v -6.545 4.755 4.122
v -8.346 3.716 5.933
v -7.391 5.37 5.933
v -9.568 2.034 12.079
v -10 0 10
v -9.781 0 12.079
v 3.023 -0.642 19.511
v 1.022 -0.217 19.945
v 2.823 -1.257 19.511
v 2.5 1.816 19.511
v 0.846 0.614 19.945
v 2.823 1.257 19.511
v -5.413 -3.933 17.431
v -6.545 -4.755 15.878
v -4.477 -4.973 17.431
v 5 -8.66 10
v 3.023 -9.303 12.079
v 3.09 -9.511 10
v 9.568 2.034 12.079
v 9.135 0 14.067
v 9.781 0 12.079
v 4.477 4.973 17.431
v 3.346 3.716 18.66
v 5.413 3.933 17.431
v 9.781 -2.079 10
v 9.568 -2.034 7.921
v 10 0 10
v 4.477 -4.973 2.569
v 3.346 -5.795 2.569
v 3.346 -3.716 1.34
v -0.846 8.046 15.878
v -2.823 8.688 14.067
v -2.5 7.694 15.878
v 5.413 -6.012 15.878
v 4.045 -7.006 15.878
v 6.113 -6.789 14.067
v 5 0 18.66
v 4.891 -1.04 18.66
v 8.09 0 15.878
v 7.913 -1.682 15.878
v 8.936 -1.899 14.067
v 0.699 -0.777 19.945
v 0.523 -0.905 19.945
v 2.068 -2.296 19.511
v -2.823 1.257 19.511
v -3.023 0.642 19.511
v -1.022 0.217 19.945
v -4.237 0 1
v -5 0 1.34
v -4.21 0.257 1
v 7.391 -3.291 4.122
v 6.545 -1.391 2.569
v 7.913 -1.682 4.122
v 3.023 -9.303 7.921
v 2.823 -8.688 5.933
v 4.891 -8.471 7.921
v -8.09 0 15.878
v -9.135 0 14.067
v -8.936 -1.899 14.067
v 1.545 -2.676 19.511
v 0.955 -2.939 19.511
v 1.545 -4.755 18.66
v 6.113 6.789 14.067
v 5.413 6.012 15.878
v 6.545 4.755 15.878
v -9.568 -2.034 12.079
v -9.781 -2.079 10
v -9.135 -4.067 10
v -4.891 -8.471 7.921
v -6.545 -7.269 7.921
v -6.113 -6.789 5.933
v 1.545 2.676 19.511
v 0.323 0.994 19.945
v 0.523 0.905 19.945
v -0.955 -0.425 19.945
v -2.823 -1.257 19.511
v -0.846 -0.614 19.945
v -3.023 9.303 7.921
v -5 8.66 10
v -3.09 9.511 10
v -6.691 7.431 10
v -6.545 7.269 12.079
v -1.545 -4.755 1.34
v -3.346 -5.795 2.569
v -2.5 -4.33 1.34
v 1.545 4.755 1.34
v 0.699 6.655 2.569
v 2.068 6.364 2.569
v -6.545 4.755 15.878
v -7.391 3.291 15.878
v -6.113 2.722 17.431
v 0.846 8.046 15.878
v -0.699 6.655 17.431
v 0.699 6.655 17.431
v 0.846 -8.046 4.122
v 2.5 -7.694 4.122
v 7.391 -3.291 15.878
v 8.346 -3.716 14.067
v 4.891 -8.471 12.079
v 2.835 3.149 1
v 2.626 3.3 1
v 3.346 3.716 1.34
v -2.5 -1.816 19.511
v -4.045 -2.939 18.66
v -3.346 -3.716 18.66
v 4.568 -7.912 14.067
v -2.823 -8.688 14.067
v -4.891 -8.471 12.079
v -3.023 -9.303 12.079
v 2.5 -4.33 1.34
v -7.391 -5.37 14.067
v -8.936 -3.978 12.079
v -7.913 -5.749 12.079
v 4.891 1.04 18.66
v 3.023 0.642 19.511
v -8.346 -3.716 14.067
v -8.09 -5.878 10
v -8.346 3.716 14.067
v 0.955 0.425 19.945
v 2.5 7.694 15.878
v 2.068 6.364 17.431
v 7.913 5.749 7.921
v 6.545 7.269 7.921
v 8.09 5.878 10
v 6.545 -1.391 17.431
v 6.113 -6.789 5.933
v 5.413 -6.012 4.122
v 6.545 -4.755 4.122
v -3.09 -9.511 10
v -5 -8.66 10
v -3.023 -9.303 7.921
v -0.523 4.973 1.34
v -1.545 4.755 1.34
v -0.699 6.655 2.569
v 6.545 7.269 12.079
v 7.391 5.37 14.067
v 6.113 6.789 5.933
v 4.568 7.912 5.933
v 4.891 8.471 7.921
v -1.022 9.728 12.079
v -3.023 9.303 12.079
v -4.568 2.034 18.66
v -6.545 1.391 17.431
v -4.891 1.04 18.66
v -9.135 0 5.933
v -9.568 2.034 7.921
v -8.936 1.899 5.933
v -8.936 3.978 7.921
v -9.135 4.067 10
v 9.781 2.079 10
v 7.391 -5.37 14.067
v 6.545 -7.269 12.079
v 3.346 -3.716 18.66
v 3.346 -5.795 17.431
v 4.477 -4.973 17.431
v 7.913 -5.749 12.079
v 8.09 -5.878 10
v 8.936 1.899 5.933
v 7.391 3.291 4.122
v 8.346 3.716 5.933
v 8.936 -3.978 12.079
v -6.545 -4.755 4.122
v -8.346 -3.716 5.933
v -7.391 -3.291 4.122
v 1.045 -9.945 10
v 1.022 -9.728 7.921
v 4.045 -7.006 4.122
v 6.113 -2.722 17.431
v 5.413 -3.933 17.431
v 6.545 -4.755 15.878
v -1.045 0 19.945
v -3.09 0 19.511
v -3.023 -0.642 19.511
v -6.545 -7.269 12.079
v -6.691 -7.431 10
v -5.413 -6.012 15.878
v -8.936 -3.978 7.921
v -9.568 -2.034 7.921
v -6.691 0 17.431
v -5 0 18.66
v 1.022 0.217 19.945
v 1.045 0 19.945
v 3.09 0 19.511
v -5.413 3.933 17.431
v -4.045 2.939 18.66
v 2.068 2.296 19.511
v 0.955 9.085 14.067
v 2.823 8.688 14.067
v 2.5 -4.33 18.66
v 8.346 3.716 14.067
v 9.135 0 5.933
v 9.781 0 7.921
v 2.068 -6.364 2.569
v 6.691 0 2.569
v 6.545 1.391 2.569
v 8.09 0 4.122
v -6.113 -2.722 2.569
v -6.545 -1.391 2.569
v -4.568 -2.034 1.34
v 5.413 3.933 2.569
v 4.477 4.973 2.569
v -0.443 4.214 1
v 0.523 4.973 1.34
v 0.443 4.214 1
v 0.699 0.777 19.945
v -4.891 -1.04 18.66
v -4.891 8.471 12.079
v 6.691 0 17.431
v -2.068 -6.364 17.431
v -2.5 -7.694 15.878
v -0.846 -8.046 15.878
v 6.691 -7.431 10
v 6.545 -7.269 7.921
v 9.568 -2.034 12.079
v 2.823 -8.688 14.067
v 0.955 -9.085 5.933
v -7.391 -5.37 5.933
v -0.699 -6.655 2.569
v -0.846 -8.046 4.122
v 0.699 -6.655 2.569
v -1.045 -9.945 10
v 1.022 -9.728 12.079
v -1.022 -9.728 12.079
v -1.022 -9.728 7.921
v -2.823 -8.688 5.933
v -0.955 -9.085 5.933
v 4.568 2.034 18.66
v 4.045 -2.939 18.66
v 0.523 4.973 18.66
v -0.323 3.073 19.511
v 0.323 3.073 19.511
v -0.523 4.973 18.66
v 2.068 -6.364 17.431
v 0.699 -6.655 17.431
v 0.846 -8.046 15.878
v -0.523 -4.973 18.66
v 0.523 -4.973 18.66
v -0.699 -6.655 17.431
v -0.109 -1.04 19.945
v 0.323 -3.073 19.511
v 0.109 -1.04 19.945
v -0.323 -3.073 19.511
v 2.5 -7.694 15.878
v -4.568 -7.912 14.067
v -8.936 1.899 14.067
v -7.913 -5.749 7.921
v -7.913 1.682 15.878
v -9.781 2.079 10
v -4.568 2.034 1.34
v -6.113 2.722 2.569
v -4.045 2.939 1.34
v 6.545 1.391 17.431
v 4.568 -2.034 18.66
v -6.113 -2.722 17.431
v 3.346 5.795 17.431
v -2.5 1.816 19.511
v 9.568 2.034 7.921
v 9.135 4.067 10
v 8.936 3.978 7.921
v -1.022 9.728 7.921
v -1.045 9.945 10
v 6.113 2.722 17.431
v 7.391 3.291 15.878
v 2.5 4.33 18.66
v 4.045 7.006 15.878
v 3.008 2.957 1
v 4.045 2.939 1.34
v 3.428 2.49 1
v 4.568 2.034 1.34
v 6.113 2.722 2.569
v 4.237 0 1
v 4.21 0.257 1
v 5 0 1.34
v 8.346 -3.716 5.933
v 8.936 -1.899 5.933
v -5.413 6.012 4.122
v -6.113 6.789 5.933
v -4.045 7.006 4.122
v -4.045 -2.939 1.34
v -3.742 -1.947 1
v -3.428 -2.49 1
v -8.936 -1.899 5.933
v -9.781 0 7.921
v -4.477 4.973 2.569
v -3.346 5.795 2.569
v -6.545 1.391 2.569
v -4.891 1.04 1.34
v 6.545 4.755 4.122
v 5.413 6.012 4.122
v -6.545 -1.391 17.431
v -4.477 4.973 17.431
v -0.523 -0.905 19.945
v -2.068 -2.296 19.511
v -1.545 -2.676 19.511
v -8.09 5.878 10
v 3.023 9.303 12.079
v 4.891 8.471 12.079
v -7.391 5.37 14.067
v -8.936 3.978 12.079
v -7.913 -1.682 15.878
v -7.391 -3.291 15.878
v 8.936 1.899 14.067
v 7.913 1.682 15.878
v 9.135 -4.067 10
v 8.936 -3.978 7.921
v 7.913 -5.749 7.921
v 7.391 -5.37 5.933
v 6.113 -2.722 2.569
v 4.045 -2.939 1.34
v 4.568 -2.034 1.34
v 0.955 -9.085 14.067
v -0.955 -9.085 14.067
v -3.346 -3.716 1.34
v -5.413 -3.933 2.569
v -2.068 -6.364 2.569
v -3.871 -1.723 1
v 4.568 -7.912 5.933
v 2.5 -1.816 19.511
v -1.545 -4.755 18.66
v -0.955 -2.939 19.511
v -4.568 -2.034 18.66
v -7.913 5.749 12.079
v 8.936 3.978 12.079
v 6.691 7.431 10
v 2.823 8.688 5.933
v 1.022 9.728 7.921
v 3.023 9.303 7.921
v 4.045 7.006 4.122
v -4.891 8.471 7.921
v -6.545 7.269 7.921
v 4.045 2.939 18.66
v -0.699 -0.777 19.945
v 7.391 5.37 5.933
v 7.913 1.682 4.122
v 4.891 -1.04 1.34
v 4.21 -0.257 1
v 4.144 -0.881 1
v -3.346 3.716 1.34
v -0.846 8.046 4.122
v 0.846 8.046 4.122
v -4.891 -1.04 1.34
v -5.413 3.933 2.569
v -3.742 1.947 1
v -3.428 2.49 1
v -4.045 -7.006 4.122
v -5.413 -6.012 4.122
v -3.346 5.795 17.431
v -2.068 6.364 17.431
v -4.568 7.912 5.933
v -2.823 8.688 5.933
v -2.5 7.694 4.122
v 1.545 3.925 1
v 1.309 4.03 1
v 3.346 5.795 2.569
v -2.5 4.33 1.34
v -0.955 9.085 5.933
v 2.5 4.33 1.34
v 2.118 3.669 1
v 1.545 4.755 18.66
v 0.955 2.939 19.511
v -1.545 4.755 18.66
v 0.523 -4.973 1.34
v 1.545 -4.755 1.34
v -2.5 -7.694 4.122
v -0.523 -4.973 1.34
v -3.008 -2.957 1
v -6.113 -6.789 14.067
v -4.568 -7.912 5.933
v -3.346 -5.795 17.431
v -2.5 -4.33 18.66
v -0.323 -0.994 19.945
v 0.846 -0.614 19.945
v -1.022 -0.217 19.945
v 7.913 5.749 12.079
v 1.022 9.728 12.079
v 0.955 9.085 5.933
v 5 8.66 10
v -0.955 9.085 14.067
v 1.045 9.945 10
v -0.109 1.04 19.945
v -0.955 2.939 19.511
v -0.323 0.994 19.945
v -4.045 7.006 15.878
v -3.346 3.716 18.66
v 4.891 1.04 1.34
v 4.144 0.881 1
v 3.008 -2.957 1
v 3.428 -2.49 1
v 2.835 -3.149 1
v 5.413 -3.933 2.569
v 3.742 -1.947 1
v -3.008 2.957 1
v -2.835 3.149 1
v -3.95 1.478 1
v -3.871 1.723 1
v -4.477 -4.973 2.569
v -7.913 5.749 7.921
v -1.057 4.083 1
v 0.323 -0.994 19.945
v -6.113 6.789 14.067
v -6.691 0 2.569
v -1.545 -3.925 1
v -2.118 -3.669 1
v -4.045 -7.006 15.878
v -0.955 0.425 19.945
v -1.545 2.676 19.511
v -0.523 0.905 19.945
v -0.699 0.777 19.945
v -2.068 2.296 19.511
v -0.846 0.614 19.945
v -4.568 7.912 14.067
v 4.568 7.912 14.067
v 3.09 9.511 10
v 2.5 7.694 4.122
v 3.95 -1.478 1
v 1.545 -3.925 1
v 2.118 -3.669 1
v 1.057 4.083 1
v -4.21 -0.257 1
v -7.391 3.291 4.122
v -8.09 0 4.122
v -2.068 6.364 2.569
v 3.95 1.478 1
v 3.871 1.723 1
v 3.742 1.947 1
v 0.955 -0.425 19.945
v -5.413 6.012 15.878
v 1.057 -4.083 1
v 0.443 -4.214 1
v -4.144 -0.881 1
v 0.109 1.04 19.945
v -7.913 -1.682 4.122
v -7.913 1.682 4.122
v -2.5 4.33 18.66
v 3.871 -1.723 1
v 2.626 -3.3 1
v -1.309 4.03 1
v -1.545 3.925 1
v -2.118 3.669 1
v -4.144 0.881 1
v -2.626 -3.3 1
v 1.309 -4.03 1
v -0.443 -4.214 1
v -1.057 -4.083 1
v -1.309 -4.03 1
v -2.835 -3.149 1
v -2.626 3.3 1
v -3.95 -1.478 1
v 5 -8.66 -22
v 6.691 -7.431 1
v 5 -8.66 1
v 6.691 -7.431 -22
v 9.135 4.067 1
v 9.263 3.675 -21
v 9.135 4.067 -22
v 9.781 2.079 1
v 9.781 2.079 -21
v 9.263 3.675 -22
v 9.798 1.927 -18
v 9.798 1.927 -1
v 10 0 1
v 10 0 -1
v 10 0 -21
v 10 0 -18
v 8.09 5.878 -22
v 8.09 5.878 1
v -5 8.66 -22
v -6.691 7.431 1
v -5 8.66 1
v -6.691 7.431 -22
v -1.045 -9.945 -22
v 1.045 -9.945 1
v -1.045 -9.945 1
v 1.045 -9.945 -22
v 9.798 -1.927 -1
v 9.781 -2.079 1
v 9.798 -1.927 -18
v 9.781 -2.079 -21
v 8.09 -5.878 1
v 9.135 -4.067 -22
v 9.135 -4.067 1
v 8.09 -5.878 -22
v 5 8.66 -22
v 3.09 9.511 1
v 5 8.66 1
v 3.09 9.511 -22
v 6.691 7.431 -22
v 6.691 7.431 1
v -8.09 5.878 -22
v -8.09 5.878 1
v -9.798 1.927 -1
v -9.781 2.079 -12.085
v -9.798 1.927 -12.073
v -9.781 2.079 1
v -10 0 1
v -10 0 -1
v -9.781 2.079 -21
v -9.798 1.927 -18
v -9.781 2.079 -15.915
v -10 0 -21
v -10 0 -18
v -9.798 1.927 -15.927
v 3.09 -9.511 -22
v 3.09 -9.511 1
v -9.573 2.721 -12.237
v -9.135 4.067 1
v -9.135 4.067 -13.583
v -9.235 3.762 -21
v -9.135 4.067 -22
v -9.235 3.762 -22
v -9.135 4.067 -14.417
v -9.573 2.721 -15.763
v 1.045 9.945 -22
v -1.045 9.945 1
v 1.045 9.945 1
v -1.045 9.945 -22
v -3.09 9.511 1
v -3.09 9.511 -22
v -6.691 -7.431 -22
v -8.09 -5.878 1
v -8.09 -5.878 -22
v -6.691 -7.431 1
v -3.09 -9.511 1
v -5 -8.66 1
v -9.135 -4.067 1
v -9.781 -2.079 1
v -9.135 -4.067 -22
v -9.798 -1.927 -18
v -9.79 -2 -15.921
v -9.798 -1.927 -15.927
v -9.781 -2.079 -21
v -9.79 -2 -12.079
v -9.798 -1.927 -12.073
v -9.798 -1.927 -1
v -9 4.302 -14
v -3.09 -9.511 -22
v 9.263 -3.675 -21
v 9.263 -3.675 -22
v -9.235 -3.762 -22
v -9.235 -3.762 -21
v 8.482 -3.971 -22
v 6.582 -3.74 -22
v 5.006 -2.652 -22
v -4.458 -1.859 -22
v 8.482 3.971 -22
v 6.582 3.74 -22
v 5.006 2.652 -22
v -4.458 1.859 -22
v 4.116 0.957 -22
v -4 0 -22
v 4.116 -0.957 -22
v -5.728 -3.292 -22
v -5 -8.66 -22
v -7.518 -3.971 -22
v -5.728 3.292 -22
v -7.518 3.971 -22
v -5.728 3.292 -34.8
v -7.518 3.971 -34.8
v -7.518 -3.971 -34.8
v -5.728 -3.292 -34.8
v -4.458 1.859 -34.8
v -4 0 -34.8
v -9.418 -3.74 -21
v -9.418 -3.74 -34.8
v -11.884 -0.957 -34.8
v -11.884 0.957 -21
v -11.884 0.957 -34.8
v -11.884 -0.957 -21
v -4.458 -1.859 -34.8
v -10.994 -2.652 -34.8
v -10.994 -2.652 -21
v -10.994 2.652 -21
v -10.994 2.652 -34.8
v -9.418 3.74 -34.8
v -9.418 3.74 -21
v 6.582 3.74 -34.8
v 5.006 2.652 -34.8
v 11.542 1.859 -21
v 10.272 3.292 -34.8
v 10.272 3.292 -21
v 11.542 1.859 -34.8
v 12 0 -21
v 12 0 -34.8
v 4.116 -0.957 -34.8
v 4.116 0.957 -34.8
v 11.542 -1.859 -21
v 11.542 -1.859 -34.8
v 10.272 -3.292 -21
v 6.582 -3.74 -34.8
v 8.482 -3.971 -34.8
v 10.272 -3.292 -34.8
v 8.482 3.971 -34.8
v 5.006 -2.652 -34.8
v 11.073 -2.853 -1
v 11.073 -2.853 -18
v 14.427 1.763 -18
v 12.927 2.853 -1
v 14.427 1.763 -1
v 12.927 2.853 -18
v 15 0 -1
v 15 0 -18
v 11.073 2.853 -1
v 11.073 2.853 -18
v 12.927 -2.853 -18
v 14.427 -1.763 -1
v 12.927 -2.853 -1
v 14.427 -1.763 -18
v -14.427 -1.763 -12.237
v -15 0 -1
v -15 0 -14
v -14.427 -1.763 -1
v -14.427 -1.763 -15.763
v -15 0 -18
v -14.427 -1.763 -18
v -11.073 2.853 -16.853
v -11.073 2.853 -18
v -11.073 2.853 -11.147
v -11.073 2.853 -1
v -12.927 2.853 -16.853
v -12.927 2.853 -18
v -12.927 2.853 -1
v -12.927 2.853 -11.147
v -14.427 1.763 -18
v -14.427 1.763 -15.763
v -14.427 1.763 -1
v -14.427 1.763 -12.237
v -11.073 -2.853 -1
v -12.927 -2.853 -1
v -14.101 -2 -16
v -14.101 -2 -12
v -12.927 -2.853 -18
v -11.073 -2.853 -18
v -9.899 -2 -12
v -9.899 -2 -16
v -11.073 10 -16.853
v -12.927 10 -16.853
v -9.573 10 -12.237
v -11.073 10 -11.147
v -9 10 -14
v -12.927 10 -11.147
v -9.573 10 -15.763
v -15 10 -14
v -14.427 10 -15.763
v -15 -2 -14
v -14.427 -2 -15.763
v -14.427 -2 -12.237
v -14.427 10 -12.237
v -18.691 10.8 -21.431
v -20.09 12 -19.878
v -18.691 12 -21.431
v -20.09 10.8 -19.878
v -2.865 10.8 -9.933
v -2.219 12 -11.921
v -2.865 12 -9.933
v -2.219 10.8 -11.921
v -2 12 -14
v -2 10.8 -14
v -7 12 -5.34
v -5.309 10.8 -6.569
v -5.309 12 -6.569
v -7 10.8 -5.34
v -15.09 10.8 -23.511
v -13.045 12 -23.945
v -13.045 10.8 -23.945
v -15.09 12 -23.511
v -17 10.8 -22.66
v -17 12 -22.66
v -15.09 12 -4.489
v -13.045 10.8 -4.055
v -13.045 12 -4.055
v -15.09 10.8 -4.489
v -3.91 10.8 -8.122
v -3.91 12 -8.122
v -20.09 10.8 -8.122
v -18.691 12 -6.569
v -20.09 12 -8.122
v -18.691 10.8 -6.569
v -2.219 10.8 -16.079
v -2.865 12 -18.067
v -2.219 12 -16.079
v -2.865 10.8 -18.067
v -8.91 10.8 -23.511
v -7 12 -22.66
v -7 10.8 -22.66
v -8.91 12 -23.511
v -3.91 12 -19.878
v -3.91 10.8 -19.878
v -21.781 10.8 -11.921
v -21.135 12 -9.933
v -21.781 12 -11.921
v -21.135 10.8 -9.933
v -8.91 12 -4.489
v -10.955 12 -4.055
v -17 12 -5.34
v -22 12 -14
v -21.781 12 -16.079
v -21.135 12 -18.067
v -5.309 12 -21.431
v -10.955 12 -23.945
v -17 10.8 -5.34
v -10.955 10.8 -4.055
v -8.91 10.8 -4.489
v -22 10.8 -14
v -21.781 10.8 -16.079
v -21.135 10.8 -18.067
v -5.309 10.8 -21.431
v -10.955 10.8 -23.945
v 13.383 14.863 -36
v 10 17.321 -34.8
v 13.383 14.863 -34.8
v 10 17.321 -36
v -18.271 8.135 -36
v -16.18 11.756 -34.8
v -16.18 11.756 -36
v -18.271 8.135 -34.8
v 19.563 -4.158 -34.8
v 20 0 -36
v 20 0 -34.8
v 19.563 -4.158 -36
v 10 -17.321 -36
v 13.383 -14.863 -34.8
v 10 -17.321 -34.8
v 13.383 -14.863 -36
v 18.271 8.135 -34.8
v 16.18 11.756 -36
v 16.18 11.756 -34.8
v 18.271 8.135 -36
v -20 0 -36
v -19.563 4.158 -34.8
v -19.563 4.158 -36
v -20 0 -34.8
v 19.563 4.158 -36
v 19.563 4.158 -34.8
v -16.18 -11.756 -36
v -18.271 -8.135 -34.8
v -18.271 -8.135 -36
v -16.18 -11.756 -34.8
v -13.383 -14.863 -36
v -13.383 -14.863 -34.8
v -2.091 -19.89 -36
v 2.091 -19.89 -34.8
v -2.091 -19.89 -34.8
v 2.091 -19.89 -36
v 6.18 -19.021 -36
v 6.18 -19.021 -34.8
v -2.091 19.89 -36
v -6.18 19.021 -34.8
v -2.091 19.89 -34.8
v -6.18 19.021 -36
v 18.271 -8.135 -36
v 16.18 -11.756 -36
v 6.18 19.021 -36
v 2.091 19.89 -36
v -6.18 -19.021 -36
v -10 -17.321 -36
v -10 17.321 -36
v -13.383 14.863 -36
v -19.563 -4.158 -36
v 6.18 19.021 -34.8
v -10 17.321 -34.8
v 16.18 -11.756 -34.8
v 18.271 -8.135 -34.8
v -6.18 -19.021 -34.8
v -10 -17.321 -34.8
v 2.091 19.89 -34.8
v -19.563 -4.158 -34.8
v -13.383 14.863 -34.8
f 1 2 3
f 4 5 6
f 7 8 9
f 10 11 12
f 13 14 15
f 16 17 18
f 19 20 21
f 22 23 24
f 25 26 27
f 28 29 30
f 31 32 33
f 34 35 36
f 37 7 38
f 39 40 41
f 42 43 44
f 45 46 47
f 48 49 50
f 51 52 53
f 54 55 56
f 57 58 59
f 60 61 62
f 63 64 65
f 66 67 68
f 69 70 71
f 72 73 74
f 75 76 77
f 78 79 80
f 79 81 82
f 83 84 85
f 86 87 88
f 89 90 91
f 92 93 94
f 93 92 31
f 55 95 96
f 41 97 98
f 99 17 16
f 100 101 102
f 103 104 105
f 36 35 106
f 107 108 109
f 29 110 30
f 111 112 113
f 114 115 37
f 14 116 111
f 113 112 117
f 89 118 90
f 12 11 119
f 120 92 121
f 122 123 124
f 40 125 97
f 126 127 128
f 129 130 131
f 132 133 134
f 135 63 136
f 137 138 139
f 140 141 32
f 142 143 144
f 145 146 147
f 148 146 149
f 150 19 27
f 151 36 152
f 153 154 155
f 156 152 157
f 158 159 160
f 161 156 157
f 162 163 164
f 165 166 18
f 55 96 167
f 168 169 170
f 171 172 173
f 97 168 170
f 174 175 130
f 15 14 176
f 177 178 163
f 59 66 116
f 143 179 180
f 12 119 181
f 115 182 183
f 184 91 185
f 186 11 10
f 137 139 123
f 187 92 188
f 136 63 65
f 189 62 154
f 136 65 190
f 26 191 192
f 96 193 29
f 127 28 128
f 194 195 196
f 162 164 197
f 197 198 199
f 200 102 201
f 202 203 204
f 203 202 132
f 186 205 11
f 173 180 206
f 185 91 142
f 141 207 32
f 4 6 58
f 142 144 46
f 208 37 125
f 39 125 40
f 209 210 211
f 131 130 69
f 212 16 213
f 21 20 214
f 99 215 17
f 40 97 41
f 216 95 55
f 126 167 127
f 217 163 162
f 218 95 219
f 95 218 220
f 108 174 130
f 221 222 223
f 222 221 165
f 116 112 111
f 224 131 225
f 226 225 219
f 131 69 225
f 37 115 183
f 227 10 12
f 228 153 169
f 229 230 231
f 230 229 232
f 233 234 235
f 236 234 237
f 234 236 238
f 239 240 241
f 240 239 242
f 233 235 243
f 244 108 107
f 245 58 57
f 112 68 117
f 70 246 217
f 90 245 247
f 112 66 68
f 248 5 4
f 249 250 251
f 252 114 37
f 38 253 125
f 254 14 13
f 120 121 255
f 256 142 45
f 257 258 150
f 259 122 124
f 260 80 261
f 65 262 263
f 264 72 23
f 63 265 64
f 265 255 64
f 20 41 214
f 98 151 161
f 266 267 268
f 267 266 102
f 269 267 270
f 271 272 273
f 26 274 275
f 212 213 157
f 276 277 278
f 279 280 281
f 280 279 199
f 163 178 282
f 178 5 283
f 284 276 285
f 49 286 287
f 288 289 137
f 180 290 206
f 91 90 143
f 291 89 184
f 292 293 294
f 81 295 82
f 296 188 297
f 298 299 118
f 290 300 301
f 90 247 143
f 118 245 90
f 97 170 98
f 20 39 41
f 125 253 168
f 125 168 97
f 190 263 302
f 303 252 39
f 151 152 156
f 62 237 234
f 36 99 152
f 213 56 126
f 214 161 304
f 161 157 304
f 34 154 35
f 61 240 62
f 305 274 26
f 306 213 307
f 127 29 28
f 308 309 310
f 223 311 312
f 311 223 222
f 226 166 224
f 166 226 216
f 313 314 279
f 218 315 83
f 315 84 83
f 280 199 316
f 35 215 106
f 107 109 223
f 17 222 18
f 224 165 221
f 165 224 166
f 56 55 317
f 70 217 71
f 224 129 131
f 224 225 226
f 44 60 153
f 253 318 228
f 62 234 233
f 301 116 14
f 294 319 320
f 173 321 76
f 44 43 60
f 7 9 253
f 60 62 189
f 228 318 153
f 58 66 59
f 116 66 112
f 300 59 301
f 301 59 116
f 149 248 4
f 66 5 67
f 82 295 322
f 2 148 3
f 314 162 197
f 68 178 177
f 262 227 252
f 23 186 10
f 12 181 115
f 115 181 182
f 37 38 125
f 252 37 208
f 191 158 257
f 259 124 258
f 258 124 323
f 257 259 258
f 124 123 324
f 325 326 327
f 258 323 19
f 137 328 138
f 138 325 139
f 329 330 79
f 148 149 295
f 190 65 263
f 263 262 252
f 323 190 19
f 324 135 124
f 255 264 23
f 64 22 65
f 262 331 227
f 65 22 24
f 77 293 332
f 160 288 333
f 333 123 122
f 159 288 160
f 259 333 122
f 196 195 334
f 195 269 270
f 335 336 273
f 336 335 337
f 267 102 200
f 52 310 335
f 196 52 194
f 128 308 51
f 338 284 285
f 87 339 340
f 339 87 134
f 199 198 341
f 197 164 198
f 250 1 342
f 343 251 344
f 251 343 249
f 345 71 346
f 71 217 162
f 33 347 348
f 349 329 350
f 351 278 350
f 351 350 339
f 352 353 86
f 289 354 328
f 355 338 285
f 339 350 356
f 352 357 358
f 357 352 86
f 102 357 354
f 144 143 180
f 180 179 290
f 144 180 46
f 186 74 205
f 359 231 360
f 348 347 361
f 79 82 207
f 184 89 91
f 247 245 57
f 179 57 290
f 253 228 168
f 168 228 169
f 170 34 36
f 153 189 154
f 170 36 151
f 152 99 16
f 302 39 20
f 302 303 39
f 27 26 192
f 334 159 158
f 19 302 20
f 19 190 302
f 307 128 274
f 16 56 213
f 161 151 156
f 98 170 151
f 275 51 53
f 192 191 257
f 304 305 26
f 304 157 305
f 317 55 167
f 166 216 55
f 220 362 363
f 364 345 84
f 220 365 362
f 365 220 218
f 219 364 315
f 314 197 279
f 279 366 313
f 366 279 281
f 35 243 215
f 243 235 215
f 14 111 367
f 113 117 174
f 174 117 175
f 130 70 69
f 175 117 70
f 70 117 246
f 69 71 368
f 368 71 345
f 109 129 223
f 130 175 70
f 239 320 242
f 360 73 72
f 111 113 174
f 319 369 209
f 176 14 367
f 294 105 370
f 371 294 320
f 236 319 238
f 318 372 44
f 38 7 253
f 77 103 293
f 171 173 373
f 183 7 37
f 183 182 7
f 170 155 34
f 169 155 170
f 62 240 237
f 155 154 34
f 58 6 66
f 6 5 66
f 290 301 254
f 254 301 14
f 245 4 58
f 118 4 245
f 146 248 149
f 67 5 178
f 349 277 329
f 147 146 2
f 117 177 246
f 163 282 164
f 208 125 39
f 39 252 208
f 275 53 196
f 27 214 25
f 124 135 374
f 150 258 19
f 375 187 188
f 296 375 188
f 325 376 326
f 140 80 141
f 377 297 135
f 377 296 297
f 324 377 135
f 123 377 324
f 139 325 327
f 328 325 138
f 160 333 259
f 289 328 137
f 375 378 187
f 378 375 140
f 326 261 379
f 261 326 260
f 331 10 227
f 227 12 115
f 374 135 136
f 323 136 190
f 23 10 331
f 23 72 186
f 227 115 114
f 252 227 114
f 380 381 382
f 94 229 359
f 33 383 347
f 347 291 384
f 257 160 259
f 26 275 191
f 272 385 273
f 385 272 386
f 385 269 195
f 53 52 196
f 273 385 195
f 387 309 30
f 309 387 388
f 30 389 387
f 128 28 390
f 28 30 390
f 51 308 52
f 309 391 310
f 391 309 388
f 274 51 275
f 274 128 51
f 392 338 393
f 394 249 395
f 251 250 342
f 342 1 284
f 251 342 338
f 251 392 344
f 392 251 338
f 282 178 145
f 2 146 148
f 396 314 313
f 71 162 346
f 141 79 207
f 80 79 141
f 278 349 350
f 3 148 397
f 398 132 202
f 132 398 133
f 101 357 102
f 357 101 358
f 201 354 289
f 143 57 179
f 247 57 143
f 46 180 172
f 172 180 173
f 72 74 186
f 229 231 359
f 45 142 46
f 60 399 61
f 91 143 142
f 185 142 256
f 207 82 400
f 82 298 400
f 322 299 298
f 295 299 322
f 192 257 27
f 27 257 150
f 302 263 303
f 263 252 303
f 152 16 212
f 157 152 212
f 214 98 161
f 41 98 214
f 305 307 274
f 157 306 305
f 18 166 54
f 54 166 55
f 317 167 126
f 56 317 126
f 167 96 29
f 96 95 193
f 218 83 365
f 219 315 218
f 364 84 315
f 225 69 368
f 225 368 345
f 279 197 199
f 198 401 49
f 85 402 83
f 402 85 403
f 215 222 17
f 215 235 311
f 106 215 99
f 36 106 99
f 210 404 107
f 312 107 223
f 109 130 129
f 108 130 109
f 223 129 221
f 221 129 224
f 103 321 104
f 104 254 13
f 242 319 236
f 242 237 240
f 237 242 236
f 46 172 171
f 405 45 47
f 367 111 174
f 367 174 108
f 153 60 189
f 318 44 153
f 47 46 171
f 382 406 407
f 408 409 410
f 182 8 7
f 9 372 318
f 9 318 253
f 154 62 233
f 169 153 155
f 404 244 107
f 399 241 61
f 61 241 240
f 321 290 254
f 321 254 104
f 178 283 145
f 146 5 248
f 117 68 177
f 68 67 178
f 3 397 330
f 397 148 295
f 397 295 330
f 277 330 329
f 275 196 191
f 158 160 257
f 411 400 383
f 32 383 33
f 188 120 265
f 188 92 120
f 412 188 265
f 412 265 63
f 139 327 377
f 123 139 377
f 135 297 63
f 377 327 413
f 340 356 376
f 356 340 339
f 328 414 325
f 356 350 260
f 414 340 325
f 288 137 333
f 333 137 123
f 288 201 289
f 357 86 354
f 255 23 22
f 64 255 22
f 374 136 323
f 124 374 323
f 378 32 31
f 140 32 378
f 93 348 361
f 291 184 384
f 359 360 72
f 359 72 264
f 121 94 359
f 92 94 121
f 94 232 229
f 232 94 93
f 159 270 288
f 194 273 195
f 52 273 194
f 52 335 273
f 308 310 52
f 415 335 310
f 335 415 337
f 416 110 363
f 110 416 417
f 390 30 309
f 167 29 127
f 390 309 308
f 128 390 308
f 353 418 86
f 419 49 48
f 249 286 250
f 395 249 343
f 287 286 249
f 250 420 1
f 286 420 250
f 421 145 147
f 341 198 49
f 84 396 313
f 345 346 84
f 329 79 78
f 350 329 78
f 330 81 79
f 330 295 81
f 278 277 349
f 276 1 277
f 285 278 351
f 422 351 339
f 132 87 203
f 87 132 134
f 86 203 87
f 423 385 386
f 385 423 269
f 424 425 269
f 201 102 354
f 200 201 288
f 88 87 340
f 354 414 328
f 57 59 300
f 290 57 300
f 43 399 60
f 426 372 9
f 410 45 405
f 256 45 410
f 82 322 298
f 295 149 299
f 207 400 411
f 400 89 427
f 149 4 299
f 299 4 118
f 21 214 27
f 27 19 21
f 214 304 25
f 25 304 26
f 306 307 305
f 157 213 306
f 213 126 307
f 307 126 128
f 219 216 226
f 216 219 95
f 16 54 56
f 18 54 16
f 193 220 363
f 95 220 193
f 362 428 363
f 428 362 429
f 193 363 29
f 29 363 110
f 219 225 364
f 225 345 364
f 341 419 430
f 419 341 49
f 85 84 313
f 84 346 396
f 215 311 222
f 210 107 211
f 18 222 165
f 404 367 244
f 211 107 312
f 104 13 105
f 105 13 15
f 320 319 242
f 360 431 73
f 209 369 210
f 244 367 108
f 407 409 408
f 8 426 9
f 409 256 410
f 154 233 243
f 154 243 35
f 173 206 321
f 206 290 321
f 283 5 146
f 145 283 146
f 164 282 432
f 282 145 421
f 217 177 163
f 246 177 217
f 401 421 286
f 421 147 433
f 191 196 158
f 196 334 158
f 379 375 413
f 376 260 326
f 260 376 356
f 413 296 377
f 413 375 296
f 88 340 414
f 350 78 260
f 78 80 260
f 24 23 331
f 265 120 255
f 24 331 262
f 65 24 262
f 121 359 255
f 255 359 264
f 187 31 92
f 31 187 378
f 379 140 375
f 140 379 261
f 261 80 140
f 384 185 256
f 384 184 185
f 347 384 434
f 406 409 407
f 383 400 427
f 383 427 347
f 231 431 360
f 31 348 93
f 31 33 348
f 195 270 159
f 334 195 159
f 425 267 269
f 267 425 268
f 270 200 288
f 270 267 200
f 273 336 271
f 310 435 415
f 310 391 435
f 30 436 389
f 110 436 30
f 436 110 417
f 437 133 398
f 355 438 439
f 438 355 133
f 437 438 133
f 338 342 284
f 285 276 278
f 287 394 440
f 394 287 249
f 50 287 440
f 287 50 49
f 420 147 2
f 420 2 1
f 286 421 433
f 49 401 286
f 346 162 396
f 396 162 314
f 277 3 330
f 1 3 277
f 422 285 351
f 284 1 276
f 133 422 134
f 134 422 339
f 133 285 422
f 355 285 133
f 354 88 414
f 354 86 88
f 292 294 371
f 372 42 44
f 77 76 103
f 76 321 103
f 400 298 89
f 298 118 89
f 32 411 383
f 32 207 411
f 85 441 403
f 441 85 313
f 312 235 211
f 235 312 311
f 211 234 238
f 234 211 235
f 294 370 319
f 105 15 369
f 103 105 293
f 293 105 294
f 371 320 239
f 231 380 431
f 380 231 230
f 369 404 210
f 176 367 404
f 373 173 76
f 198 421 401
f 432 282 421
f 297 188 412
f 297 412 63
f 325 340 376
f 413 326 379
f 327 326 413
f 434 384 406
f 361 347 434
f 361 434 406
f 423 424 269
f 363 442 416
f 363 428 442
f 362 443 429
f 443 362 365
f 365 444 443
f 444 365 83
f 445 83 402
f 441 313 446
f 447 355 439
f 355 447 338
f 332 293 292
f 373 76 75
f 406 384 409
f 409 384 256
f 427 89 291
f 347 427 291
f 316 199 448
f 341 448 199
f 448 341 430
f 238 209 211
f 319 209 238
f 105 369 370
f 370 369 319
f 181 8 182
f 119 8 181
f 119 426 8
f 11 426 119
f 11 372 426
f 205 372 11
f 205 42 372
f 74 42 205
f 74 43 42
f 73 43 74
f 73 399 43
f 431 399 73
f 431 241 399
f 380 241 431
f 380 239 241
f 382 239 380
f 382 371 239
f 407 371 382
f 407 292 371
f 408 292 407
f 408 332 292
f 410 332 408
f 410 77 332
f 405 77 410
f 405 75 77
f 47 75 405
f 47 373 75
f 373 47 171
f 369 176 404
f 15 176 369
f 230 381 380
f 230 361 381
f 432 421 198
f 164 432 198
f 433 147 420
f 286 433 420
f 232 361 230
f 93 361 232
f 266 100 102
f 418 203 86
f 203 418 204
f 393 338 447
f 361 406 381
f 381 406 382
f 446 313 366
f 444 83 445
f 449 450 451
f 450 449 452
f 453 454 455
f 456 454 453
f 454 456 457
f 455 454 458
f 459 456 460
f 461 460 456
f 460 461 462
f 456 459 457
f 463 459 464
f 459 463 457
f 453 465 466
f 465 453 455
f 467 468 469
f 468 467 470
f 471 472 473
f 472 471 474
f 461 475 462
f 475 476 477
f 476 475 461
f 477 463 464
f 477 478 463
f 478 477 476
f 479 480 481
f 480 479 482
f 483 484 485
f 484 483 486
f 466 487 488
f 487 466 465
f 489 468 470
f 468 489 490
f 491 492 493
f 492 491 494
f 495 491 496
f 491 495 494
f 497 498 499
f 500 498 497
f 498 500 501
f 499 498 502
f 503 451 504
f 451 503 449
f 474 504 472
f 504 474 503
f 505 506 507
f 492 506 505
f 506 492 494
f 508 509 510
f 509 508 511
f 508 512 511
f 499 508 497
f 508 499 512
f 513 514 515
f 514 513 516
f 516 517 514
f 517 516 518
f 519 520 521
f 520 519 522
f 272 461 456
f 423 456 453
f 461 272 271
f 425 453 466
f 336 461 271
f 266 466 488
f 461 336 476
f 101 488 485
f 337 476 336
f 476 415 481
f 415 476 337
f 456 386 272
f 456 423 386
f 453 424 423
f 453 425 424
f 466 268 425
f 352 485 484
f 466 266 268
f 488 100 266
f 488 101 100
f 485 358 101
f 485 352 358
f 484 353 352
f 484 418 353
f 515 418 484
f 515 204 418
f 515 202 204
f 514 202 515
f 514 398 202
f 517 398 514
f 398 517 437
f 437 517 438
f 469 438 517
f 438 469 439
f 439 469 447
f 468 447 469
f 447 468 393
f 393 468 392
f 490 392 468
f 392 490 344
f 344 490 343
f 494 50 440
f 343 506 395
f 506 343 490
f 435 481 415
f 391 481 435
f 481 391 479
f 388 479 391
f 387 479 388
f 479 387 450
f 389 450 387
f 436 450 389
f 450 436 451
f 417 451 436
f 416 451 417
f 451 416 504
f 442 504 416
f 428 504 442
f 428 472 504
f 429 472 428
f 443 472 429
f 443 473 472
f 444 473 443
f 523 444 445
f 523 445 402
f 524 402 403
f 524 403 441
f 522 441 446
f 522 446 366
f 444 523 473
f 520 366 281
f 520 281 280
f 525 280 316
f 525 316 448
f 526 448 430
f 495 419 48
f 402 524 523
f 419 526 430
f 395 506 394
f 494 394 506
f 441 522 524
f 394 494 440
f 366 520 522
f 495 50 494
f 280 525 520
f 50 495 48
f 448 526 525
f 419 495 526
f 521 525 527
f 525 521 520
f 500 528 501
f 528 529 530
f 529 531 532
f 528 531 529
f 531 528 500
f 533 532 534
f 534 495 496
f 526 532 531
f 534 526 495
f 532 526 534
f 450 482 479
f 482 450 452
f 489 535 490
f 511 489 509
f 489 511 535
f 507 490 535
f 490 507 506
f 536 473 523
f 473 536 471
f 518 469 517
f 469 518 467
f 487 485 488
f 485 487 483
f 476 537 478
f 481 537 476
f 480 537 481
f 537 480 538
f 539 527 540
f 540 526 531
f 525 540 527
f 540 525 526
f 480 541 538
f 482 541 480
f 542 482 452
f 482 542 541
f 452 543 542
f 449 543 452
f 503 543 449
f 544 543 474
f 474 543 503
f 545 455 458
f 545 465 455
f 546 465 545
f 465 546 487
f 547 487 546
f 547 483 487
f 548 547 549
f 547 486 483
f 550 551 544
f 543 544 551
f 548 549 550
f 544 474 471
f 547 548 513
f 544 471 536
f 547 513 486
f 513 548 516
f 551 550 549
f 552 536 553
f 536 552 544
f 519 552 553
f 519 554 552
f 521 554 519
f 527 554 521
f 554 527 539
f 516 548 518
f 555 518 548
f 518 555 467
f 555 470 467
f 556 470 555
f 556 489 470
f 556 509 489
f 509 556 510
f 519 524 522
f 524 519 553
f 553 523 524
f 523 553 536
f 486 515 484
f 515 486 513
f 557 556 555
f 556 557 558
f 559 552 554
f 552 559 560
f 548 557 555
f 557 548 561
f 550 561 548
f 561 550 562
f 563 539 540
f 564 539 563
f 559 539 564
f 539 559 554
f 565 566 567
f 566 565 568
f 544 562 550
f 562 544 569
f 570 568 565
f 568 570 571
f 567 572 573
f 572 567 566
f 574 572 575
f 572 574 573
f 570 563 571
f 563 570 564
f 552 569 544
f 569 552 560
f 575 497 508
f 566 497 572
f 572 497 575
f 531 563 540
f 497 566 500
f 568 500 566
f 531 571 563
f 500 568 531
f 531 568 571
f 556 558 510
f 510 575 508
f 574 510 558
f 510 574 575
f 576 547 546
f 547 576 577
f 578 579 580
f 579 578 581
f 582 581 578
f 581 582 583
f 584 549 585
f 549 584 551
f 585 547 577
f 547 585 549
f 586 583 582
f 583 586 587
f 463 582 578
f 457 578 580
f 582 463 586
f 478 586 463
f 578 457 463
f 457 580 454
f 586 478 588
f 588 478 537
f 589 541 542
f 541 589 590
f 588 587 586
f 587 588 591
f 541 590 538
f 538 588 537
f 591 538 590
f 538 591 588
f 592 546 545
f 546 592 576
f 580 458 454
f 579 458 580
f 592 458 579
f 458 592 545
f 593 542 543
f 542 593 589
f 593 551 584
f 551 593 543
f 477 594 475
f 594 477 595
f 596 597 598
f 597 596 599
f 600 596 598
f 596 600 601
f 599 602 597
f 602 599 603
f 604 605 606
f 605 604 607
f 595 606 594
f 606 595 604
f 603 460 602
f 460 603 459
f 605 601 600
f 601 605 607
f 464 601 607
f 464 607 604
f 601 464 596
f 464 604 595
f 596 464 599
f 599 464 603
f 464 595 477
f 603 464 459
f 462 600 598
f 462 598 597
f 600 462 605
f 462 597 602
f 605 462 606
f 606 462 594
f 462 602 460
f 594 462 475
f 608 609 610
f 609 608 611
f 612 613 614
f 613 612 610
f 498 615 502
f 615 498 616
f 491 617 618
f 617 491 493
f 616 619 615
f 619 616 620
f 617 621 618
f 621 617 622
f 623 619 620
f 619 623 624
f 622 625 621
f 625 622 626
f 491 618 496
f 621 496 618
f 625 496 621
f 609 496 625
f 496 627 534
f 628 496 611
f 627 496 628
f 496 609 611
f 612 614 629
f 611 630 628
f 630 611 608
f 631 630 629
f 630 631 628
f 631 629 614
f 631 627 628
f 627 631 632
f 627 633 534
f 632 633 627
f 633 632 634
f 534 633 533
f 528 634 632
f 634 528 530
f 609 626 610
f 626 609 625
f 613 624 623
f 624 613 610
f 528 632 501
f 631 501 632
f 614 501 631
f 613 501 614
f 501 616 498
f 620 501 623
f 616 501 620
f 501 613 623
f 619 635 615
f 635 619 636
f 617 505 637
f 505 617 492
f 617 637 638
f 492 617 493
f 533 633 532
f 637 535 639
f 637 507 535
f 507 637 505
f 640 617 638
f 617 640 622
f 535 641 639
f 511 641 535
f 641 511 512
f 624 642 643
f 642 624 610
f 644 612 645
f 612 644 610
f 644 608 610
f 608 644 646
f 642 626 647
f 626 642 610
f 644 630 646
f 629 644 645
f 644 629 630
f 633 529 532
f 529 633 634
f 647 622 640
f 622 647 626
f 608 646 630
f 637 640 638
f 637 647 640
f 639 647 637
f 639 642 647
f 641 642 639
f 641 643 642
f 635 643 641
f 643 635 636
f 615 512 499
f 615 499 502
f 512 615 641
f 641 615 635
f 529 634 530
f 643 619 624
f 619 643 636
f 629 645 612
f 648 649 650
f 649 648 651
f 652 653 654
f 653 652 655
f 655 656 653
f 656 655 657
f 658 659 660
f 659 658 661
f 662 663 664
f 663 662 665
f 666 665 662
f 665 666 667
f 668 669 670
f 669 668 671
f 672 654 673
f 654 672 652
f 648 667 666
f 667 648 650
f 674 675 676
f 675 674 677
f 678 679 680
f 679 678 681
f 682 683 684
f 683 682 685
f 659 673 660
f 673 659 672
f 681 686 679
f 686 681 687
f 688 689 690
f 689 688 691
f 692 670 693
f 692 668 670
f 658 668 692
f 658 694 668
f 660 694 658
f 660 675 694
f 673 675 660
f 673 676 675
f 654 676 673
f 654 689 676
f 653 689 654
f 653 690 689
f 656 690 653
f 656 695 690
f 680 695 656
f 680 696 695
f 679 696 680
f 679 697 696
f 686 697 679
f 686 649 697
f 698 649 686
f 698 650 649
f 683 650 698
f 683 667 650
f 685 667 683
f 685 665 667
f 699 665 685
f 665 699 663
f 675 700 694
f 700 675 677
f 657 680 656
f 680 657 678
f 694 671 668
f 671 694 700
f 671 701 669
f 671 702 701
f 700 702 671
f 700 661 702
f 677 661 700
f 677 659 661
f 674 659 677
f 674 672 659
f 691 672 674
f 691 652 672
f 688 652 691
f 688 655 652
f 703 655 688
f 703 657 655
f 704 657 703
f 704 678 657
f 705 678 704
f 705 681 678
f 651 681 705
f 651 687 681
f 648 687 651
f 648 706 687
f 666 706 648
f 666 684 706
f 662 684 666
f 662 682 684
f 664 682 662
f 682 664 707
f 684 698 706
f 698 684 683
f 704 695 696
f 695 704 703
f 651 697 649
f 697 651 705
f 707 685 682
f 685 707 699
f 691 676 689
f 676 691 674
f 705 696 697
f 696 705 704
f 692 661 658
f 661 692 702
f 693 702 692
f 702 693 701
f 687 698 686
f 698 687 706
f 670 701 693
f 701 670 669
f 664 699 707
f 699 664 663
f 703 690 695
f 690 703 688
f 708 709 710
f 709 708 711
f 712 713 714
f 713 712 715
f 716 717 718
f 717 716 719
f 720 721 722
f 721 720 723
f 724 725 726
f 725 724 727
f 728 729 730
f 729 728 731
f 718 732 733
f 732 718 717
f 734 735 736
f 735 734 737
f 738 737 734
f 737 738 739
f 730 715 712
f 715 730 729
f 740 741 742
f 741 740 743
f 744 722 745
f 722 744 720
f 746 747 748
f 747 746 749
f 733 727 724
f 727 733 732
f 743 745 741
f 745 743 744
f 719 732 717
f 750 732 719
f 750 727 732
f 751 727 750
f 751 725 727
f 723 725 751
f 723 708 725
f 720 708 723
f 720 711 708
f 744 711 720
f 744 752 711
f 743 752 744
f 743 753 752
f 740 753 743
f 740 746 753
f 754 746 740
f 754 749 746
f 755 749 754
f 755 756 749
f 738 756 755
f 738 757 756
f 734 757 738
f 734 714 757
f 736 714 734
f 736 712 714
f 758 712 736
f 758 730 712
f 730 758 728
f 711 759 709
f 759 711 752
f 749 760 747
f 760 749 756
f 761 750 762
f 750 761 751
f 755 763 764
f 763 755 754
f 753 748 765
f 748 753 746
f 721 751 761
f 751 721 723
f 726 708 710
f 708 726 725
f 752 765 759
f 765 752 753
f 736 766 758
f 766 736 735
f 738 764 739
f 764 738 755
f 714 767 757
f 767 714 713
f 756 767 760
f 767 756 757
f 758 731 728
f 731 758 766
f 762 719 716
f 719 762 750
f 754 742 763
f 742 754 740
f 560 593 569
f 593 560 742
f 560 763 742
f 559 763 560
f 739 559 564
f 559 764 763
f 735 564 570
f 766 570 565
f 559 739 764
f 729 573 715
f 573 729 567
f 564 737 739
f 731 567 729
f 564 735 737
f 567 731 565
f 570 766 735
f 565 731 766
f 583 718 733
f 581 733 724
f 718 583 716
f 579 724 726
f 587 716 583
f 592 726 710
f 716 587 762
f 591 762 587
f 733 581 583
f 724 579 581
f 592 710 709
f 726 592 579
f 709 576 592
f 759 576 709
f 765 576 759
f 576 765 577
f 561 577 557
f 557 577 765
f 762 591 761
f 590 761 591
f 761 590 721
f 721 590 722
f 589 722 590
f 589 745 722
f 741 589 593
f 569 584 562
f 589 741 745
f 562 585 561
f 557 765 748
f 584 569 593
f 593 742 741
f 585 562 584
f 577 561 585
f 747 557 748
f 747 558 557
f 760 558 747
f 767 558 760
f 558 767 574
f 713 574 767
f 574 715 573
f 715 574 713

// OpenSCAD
module up(z)
{
translate([0,0,z]) child(0);
}

module down(z)
{
translate([0,0,-z]) child(0);
}

module right(x)
{
translate([x,0,0])child(0);
}

module left(x)
{
translate([-x,0,0])child(0);
}

module forward(y)
{
    translate([0,y,0])child(0);
}


up (10) sphere(r=10,h=6);

down (22) cylinder (r=10,h=23);

left(8) down (35) cylinder (r=4, h=14);

right(8) down (35) cylinder (r=4, h=14);

right (12) down (18) cylinder (r=3,h=17);

down(18) left (12) cylinder (r=3,h=17);
forward(10) left (12) down (14) rotate([90,0,0]) cylinder(r=3,h=12);
down(14) left(12) forward(12) rotate([90,0,0]) cylinder(r=10, h=1.2);

down (36) cylinder(r=20,h=1.2);
